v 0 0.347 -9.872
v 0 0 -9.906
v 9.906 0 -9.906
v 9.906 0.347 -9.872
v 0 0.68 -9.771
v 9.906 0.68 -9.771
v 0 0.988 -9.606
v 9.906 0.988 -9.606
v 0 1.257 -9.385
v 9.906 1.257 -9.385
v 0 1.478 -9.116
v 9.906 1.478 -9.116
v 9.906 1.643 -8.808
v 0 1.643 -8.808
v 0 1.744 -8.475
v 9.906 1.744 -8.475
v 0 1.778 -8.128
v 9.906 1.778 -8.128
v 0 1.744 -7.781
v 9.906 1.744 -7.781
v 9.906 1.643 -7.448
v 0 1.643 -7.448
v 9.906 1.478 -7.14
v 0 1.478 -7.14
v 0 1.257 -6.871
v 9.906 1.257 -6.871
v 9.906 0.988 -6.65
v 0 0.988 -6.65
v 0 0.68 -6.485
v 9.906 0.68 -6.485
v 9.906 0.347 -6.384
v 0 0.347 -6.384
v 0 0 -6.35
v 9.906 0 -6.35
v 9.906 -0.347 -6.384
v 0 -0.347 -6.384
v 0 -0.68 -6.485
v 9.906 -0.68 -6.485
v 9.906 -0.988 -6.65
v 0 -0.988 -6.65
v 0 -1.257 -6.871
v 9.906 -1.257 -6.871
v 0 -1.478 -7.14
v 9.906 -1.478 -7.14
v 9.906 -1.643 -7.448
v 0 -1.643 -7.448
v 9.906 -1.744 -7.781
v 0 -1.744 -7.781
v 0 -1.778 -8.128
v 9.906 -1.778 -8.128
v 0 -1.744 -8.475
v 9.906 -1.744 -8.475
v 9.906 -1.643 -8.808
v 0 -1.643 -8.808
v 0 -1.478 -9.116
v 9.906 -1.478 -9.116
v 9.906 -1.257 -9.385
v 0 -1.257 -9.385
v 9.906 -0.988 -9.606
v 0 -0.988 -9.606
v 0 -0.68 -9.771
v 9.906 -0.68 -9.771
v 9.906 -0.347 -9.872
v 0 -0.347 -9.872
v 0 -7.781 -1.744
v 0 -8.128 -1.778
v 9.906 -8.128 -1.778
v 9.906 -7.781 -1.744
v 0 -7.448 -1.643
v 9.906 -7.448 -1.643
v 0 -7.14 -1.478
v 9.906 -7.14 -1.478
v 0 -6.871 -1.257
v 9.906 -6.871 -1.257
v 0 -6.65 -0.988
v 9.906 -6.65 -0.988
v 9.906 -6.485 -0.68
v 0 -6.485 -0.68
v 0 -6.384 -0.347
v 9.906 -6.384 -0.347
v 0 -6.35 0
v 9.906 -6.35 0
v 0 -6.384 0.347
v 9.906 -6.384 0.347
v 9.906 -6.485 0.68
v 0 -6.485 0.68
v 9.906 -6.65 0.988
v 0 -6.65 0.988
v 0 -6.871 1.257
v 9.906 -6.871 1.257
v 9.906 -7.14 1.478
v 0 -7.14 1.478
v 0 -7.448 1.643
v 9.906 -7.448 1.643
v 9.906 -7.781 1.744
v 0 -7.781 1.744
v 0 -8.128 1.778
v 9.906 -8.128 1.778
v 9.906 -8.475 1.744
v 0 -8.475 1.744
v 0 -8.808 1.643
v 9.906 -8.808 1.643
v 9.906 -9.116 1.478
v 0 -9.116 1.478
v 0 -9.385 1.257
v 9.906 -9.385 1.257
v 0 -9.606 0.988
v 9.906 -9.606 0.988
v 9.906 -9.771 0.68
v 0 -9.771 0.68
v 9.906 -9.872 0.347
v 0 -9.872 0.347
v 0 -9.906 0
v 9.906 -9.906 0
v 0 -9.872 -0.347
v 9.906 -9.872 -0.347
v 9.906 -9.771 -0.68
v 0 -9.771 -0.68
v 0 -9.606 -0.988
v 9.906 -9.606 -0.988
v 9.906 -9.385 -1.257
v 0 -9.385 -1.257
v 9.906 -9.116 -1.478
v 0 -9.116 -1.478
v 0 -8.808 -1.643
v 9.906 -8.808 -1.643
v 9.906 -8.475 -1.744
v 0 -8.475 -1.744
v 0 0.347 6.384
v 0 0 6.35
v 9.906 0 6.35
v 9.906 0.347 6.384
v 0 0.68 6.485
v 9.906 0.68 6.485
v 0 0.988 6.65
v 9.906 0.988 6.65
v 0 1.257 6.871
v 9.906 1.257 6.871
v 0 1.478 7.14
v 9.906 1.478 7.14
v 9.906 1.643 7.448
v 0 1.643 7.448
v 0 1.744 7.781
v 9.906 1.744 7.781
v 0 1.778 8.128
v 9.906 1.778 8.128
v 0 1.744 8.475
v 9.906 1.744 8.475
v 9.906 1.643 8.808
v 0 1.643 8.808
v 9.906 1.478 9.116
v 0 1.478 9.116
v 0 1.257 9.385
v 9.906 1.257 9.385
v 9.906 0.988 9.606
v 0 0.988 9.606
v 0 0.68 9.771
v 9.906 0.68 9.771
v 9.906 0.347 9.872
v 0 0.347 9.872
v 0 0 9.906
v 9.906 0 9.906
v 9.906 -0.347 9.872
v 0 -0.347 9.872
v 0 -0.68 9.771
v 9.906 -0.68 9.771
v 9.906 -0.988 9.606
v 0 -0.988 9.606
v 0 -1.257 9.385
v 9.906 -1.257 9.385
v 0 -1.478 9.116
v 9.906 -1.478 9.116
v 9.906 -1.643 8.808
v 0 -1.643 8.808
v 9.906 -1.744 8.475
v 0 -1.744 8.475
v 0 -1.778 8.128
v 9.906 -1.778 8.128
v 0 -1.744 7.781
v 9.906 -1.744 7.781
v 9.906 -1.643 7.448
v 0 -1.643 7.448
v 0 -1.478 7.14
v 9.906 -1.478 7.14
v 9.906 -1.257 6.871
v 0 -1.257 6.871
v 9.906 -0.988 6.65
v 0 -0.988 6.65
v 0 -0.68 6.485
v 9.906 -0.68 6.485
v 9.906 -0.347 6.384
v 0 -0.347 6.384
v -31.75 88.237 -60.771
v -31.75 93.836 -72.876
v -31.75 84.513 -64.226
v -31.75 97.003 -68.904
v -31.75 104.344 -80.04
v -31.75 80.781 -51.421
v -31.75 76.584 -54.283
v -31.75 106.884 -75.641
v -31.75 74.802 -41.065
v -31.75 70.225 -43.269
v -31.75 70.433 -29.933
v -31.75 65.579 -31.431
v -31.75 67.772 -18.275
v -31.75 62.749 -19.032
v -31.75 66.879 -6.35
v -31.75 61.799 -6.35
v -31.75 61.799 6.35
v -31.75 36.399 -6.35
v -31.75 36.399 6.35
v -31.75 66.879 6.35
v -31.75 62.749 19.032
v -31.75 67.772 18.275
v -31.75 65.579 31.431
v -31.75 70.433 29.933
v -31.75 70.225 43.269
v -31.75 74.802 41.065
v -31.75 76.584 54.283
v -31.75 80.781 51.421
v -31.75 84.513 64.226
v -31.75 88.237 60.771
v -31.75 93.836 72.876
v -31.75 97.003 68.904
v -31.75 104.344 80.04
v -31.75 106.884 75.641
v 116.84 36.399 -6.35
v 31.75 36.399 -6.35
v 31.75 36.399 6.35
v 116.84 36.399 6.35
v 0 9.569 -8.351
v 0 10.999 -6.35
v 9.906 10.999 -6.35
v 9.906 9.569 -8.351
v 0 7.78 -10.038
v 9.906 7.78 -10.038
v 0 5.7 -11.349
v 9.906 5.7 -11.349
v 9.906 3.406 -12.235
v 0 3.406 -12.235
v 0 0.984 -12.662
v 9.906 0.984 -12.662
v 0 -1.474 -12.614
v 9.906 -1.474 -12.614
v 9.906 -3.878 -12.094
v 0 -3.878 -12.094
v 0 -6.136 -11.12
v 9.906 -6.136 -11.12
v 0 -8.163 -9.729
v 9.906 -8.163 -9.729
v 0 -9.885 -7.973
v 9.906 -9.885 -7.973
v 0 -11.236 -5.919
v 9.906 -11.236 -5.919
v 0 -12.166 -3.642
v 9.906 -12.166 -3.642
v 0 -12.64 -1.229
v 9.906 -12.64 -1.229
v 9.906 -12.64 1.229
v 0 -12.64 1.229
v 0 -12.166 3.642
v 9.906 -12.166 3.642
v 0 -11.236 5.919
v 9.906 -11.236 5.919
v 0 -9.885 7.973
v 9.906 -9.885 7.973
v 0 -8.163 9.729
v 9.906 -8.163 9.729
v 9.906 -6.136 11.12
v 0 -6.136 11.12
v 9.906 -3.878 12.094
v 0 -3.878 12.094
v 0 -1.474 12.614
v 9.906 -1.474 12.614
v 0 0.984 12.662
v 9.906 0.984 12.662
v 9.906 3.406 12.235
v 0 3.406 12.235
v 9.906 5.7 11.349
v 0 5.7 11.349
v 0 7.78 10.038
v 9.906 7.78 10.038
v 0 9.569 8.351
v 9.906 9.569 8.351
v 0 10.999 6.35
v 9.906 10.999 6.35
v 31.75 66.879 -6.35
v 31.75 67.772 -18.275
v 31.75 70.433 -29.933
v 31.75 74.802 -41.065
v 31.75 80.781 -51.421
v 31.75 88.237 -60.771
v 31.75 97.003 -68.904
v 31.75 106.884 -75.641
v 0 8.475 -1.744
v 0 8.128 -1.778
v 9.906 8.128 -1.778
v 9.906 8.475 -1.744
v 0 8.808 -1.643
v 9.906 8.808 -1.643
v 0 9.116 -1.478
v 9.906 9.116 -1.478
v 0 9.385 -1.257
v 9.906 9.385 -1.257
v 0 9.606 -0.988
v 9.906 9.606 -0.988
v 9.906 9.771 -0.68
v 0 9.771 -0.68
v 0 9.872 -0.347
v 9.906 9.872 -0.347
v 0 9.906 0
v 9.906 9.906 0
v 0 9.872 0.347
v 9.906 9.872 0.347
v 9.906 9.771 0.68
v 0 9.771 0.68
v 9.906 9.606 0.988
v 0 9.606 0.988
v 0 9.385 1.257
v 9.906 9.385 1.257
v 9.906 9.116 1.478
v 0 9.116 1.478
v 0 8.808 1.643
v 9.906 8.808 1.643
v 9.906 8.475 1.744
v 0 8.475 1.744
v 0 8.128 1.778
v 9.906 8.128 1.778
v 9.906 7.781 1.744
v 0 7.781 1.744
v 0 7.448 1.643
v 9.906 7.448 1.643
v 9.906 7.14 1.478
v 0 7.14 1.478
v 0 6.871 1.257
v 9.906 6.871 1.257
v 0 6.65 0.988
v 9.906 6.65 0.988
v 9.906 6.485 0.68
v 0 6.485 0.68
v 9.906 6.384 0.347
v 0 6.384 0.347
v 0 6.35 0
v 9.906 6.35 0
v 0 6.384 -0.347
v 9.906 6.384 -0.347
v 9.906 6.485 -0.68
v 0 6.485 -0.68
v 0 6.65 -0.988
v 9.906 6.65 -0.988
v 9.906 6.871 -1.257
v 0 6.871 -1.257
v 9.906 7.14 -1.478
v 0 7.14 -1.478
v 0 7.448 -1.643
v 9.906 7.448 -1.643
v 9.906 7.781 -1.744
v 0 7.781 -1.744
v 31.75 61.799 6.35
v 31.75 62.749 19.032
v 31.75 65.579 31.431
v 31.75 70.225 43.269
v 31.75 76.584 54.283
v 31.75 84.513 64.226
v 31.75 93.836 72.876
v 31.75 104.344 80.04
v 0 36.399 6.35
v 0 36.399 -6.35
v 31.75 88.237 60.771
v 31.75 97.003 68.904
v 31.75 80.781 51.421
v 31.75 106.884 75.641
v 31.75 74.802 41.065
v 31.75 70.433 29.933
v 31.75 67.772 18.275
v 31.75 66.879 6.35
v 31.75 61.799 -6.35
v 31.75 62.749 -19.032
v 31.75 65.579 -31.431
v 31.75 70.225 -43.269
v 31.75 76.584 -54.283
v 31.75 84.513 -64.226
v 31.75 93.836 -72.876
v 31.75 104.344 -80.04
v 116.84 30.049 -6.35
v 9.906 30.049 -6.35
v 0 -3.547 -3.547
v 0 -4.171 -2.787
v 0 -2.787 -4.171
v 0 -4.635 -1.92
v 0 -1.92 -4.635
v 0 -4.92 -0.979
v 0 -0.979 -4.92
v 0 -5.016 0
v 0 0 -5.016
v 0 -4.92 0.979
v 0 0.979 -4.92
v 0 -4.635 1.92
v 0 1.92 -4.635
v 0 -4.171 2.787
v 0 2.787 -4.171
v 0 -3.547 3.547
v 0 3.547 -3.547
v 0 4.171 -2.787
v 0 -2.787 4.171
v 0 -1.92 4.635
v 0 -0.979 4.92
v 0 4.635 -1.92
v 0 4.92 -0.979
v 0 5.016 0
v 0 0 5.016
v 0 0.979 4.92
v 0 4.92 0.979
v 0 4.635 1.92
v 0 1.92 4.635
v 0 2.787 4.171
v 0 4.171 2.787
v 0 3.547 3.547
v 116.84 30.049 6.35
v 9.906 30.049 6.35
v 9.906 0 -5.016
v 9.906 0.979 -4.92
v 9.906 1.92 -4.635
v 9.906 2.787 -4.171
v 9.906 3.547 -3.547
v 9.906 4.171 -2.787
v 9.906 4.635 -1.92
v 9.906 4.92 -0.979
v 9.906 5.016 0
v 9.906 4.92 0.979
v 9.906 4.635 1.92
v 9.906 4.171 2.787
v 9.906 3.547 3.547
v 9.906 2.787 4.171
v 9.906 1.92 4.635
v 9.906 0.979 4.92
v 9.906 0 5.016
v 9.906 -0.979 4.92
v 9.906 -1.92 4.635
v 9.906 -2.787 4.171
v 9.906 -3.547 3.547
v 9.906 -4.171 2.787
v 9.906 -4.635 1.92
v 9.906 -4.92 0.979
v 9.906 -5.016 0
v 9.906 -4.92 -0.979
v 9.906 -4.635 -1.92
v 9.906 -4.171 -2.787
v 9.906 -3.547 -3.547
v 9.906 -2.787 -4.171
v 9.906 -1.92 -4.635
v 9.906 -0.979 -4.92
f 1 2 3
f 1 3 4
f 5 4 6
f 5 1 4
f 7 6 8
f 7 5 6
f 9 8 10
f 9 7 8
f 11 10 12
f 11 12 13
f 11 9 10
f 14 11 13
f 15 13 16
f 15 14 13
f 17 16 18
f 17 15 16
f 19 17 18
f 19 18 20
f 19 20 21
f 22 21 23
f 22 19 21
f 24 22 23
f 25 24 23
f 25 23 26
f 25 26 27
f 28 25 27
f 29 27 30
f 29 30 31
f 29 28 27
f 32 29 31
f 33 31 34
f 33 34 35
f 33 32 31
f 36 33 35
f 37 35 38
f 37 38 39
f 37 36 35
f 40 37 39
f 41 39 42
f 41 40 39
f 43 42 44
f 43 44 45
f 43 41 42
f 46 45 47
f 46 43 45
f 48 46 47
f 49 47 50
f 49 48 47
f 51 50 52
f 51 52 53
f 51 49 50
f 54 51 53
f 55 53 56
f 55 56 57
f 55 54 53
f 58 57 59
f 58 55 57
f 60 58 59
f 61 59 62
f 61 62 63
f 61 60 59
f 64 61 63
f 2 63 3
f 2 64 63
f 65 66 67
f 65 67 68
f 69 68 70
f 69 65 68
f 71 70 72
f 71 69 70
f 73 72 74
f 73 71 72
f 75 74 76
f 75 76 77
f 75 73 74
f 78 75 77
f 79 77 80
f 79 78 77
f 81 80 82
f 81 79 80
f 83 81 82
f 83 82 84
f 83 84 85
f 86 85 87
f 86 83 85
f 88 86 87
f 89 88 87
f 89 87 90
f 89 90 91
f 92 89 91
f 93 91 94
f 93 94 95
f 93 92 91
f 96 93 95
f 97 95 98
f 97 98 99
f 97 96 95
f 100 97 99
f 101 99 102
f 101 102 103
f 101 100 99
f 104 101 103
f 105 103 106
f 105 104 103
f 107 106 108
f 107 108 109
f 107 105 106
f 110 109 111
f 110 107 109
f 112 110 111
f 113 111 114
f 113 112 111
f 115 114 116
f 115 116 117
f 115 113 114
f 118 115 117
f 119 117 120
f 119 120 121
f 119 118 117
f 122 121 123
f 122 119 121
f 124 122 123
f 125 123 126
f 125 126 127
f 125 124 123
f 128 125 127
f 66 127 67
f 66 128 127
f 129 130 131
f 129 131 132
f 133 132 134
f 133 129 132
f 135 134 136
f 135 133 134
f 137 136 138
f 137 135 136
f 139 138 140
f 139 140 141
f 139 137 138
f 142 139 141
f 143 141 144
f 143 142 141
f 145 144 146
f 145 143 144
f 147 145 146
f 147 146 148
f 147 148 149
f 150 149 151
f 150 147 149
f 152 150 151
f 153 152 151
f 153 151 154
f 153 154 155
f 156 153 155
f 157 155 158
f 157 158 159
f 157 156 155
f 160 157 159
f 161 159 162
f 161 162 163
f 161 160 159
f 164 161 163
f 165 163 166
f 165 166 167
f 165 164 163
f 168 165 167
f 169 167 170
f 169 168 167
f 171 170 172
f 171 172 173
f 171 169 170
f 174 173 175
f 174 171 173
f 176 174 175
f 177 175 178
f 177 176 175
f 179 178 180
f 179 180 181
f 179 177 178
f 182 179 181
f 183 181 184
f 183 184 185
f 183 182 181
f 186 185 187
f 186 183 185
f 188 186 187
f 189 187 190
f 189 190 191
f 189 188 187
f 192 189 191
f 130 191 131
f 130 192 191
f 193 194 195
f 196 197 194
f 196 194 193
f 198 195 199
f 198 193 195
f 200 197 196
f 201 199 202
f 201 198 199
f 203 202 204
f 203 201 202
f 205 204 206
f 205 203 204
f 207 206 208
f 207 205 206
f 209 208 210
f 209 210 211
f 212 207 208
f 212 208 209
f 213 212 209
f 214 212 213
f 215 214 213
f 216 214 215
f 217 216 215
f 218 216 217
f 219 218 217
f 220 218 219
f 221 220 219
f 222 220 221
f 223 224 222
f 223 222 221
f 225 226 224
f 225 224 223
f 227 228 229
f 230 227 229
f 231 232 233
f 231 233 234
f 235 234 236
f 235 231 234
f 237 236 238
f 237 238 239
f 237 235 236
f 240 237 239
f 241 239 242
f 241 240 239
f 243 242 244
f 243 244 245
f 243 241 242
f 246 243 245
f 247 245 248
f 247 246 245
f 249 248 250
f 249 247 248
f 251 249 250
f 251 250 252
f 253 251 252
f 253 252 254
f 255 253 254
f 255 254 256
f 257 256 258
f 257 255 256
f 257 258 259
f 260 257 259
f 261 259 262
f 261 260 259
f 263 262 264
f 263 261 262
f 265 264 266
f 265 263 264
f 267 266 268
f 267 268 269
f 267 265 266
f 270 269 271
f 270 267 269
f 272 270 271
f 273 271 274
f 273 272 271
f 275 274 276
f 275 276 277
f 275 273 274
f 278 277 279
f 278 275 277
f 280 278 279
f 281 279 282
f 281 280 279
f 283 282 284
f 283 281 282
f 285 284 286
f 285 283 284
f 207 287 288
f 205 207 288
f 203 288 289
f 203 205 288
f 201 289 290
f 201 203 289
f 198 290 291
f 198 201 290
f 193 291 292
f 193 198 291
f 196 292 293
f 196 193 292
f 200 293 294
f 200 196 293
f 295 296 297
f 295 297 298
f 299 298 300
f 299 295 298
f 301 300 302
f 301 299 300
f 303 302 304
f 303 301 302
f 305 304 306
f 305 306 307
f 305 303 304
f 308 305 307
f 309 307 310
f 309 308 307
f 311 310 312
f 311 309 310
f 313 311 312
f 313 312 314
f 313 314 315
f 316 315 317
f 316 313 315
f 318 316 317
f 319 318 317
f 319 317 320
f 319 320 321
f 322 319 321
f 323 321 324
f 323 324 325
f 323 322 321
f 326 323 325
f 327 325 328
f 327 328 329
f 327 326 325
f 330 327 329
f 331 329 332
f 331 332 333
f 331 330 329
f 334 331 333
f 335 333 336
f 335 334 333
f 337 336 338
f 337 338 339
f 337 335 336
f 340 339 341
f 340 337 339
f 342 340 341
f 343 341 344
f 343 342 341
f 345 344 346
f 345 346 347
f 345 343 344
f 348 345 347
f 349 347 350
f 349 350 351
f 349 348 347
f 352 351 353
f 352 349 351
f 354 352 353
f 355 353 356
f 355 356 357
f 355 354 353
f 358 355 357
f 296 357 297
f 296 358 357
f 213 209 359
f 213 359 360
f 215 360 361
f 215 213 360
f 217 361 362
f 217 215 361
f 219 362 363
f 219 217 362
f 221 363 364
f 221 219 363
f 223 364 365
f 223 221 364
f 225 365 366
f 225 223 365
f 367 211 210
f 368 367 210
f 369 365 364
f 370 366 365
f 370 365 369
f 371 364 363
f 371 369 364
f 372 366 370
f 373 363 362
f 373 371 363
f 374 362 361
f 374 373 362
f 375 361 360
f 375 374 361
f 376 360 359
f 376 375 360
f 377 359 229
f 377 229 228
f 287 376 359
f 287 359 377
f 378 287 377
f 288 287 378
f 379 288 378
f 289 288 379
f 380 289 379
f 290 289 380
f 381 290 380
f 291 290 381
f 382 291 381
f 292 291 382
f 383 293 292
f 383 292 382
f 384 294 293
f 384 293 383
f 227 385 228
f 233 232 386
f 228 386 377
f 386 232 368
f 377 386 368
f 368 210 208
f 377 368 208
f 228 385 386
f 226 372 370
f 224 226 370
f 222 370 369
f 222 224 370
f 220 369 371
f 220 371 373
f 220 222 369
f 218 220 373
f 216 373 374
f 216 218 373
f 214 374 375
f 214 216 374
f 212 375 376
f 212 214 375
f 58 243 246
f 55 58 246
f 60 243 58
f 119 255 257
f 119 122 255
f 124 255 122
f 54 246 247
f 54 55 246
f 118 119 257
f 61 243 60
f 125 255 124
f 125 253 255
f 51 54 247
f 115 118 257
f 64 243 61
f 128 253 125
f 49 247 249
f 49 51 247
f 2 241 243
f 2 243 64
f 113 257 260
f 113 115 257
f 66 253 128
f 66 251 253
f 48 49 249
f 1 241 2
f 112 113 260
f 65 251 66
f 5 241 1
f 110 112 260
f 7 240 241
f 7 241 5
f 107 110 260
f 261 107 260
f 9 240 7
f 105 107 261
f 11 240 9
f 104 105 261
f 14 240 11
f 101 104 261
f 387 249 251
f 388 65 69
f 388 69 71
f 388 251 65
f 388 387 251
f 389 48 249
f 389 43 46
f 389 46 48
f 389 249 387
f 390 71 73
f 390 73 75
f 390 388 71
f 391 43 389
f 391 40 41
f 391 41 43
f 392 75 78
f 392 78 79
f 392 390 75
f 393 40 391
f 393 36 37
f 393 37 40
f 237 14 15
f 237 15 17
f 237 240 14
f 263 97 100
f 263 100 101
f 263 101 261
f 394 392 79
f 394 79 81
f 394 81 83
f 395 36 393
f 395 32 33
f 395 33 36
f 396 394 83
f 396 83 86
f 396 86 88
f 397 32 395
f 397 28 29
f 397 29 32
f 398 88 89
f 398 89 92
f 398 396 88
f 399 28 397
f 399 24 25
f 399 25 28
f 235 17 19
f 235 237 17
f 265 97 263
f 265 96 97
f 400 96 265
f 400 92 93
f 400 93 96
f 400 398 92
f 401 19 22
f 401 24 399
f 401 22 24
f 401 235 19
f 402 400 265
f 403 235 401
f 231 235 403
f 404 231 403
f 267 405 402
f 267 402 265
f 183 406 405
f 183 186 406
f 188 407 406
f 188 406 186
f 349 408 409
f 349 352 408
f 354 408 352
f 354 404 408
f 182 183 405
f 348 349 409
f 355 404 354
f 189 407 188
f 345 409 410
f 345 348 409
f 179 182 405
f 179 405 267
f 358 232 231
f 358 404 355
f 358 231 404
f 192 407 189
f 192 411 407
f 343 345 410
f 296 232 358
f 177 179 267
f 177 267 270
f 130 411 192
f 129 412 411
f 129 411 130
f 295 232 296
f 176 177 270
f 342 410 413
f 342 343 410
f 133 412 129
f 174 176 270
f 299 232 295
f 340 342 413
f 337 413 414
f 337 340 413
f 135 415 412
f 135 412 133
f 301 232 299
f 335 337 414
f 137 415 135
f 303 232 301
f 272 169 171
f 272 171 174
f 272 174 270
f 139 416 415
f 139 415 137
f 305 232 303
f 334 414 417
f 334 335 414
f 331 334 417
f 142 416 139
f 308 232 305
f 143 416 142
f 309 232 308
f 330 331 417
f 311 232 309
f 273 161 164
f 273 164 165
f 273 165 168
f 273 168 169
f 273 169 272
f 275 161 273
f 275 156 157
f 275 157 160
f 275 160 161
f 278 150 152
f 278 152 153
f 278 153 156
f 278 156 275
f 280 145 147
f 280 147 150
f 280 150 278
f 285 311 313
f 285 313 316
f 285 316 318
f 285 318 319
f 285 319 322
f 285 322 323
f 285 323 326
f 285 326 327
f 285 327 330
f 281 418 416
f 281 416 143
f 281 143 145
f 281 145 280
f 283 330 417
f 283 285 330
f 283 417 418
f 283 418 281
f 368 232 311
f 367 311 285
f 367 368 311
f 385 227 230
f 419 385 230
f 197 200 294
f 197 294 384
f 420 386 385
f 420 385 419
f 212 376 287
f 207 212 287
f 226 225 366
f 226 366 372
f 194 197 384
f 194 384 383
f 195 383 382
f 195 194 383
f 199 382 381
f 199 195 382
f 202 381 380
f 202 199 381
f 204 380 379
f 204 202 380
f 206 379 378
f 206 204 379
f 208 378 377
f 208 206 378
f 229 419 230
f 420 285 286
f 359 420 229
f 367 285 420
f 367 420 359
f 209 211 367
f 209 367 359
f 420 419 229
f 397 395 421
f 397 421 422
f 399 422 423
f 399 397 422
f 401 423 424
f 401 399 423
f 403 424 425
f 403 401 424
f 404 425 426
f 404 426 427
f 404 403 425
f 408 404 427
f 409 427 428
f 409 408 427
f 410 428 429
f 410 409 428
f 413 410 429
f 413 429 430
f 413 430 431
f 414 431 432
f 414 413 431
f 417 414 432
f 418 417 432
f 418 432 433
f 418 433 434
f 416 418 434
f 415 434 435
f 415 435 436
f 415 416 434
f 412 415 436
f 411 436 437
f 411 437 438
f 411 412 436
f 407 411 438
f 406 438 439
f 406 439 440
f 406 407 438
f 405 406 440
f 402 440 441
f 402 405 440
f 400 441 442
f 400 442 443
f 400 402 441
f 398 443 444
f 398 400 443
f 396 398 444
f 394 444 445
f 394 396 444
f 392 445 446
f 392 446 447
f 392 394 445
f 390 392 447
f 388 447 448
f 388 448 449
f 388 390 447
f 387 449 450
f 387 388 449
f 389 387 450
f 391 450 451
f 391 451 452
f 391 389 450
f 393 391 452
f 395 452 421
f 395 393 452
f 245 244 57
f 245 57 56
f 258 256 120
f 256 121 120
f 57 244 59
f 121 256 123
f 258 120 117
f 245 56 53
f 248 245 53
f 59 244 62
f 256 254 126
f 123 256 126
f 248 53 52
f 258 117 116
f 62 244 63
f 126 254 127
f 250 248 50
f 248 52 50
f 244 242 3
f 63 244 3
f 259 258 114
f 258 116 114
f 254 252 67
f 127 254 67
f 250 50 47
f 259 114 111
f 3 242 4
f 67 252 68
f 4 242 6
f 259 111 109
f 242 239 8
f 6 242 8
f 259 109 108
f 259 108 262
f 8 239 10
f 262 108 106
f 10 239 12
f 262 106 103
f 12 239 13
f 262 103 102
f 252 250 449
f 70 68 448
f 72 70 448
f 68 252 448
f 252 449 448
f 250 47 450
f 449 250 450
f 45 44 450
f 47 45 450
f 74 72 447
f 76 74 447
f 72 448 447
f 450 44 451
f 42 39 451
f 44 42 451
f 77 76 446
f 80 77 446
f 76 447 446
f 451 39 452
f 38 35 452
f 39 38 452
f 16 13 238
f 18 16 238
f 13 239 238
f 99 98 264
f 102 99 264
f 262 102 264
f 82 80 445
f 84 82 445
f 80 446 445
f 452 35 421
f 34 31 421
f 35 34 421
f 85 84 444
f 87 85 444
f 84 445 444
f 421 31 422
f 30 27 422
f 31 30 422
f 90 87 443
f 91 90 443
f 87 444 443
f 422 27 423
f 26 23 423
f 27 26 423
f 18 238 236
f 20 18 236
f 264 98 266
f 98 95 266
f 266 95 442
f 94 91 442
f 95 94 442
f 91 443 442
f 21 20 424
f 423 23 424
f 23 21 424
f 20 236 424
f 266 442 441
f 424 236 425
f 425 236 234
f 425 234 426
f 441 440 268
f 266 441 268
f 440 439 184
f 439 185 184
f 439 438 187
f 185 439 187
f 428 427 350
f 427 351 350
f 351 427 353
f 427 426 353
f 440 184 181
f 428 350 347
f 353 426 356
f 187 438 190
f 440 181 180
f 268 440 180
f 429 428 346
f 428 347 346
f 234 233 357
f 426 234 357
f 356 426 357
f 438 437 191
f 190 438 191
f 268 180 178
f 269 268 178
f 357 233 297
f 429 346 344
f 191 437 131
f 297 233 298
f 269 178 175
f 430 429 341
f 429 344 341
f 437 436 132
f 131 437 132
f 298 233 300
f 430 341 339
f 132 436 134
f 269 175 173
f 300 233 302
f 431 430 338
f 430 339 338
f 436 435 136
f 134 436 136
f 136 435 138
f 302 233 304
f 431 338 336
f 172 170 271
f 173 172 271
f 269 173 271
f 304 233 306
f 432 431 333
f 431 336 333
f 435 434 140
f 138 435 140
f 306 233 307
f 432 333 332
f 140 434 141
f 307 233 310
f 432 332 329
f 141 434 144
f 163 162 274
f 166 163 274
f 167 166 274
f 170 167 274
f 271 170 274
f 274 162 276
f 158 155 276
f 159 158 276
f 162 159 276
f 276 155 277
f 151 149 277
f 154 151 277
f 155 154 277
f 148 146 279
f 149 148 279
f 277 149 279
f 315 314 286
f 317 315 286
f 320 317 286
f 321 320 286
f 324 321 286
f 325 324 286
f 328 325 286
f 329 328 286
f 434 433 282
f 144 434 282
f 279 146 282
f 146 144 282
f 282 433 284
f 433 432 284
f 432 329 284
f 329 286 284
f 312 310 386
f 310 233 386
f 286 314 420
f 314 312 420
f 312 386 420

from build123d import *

# Parameters (mm, degrees)
SKETCH1_R                = 5.0165
SKETCH1_R_2              = 1.778
BOSS_EXTRUDE1_DEPTH      = 9.906
BOSS_EXTRUDE2_DEPTH      = 31.75
BOSS_EXTRUDE2_DEPTH_BACK = 31.75
BOSS_EXTRUDE3_START      = -9.906
SKETCH4_W                = 12.7
SKETCH4_H                = 6.35
BOSS_EXTRUDE3_DEPTH      = 106.934
BOSS_EXTRUDE4_START      = -41.656
SKETCH5_W                = 12.7
SKETCH5_H                = 25.4
BOSS_EXTRUDE4_DEPTH      = 63.5


with BuildPart() as part:
    # Sketch1 → Boss-Extrude1 (new body)
    with BuildSketch(Plane(origin=(0, 0, 0), x_dir=(0, 0, -1), z_dir=(1, 0, 0))):
        with BuildLine():
            Line((-6.35, 10.998522628), (-6.35, 61.798522628))
            Line((-6.35, 61.798522628), (6.35, 61.798522628))
            Line((6.35, 61.798522628), (6.35, 10.998522628))
            ThreePointArc((6.35, 10.998522628), (0, -12.7), (-6.35, 10.998522628))
        make_face()
        Circle(SKETCH1_R, mode=Mode.SUBTRACT)
        with Locations((-8.128, 0)):
            Circle(SKETCH1_R_2, mode=Mode.SUBTRACT)
        with Locations((8.128, 0)):
            Circle(SKETCH1_R_2, mode=Mode.SUBTRACT)
        with Locations((0, -8.128)):
            Circle(SKETCH1_R_2, mode=Mode.SUBTRACT)
        with Locations((0, 8.128)):
            Circle(SKETCH1_R_2, mode=Mode.SUBTRACT)
    extrude(amount=BOSS_EXTRUDE1_DEPTH)

    # Sketch3 → Boss-Extrude2 (add, two sides: drawn at the far end of the back side and taken through both)
    with BuildSketch(Plane(origin=(0, 0, 0), x_dir=(0, 0, -1), z_dir=(1, 0, 0)).offset(-BOSS_EXTRUDE2_DEPTH_BACK)):
        with BuildLine():
            Line((-80.040101608, 104.343522628), (-75.640692557, 106.883522628))
            ThreePointArc((-75.640692557, 106.883522628), (-46.355, 77.597830071), (-6.35, 66.878522628))
            Line((-6.35, 66.878522628), (6.35, 66.878522628))
            ThreePointArc((6.35, 66.878522628), (46.355, 77.597830071), (75.640692557, 106.883522628))
            Line((75.640692557, 106.883522628), (80.040101608, 104.343522628))
            ThreePointArc((80.040101608, 104.343522628), (48.895, 73.19842102), (6.35, 61.798522628))
            Line((6.35, 61.798522628), (-6.35, 61.798522628))
            ThreePointArc((-6.35, 61.798522628), (-48.895, 73.19842102), (-80.040101608, 104.343522628))
        make_face()
    extrude(amount=BOSS_EXTRUDE2_DEPTH + BOSS_EXTRUDE2_DEPTH_BACK)

    # Sketch4 → Boss-Extrude3 (add)
    with BuildSketch(Plane.ZY.offset(BOSS_EXTRUDE3_START)):
        with Locations((0, 33.223522628)):
            Rectangle(SKETCH4_W, SKETCH4_H)
    extrude(amount=-BOSS_EXTRUDE3_DEPTH)

    # Sketch5 → Boss-Extrude4 (add)
    with BuildSketch(Plane(origin=(9.906, 0, 0), x_dir=(0, 0, -1), z_dir=(1, 0, 0)).offset(BOSS_EXTRUDE4_START)):
        with Locations((0, 49.098522628)):
            Rectangle(SKETCH5_W, SKETCH5_H)
    extrude(amount=BOSS_EXTRUDE4_DEPTH)


solid = part.part
